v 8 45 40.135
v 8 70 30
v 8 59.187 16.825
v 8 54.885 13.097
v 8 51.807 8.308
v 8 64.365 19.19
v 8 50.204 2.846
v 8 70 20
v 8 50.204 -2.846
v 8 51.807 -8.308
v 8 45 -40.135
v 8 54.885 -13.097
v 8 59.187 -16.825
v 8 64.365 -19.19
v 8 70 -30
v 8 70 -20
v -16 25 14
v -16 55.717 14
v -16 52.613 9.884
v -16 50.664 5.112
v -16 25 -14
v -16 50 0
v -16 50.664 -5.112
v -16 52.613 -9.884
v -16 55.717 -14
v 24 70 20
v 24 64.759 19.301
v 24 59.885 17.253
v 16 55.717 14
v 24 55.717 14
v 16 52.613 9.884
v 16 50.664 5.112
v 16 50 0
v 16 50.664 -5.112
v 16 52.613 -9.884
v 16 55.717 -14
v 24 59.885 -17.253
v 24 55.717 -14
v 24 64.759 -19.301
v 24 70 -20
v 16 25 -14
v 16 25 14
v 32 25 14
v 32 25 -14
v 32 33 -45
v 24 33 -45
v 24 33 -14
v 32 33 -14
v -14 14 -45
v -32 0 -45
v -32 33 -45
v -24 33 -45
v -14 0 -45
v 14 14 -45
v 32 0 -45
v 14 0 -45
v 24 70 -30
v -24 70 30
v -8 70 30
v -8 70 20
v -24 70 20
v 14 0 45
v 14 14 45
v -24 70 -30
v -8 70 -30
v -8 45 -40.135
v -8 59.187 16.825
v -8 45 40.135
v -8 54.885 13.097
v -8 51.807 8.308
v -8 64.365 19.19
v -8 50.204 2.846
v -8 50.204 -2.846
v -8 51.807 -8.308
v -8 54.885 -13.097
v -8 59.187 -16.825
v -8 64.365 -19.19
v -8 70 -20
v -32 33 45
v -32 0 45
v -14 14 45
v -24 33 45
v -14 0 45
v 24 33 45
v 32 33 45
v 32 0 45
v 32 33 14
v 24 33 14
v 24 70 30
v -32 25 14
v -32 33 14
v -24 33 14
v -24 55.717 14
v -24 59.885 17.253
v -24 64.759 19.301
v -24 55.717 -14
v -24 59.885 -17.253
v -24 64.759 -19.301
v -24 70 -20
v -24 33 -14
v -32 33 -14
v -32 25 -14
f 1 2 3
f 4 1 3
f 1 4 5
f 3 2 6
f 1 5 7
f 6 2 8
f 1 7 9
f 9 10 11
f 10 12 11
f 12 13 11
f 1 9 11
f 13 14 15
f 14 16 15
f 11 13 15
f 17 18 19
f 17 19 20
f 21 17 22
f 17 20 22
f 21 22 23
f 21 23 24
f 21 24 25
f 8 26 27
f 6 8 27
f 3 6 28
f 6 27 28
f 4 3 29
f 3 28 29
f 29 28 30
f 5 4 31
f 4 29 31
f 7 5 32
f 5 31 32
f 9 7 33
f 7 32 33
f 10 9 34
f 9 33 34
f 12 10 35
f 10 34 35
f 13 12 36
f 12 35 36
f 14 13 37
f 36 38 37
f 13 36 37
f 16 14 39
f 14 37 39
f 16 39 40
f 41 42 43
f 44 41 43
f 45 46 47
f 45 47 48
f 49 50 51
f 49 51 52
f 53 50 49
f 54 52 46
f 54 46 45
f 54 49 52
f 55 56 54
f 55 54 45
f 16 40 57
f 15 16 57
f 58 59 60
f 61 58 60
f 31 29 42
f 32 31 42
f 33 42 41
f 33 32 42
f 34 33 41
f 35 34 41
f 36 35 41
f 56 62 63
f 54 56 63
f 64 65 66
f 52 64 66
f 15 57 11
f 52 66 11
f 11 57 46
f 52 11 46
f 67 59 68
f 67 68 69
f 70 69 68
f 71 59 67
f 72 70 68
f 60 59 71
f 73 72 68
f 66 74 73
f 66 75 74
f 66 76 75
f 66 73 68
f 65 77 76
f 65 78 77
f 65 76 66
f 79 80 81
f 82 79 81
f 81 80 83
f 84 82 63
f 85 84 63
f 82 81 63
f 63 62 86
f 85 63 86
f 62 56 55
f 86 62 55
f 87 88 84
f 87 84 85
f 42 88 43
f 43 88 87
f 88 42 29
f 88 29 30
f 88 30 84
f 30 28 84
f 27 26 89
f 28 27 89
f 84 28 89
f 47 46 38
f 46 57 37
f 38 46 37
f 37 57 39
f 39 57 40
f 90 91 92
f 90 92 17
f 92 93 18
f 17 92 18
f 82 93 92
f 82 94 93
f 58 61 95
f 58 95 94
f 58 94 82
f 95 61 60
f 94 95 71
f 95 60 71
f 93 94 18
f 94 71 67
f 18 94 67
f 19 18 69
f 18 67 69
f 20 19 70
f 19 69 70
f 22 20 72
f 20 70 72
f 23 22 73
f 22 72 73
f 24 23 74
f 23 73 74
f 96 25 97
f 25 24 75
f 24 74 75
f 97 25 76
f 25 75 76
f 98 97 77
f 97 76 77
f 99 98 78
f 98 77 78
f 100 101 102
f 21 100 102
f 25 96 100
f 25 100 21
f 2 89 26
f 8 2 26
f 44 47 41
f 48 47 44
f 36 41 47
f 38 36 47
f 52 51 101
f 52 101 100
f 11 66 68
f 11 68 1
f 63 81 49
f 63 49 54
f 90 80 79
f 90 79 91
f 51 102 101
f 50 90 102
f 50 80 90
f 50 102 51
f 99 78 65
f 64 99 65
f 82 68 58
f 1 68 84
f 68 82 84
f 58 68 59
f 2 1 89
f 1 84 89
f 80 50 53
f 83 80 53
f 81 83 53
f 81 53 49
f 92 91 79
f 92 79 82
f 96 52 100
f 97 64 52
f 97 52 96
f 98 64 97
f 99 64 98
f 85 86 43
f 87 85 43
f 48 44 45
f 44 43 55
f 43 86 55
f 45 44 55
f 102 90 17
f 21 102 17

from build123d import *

# Parameters (mm, degrees)
SKETCH1_W           = 64
SKETCH1_H           = 90
BOSS_EXTRUDE1_DEPTH = 33
BOSS_EXTRUDE2_DEPTH = 24
SKETCH3_W           = 16
SKETCH3_H           = 92.520376572
CUT_EXTRUDE1_DEPTH  = 25
SKETCH6_W           = 16
SKETCH6_H           = 28
CUT_EXTRUDE3_DEPTH  = 45
SKETCH7_W           = 28
SKETCH7_H           = 14
CUT_EXTRUDE4_DEPTH  = 91


with BuildPart() as part:
    # Sketch1 → Boss-Extrude1 (new body)
    with BuildSketch(Plane(origin=(0, 0, 0), x_dir=(1, 0, 0), z_dir=(0, 1, 0))):
        Rectangle(SKETCH1_W, SKETCH1_H)
    extrude(amount=BOSS_EXTRUDE1_DEPTH)

    # Sketch2 → Boss-Extrude2 (add, symmetric)
    with BuildSketch(Plane(origin=(0, 0, 0), x_dir=(0, 0, -1), z_dir=(1, 0, 0))):
        with BuildLine():
            Line((45, 33), (-45, 33))
            Line((-45, 33), (-30, 70))
            Line((-30, 70), (-20, 70))
            ThreePointArc((-20, 70), (0, 50), (20, 70))
            Line((20, 70), (30, 70))
            Line((30, 70), (45, 33))
        make_face()
    extrude(amount=BOSS_EXTRUDE2_DEPTH, both=True)

    # Sketch3 → Cut-Extrude1 (cut)
    with BuildSketch(Plane(origin=(0, 70, 0), x_dir=(1, 0, 0), z_dir=(0, 1, 0))):
        Rectangle(SKETCH3_W, SKETCH3_H)
    extrude(amount=-CUT_EXTRUDE1_DEPTH, mode=Mode.SUBTRACT)

    # Sketch6 → Cut-Extrude3 (cut)
    with BuildSketch(Plane(origin=(0, 70, 0), x_dir=(1, 0, 0), z_dir=(0, 1, 0))):
        with Locations((24, 0)):
            Rectangle(SKETCH6_W, SKETCH6_H)
        with Locations((-24, 0)):
            Rectangle(SKETCH6_W, SKETCH6_H)
    extrude(amount=-CUT_EXTRUDE3_DEPTH, mode=Mode.SUBTRACT)

    # Sketch7 → Cut-Extrude4 (cut, through all)
    with BuildSketch(Plane.XY.offset(45)):
        with Locations((0, 7)):
            Rectangle(SKETCH7_W, SKETCH7_H)
    extrude(amount=-CUT_EXTRUDE4_DEPTH, mode=Mode.SUBTRACT)


solid = part.part
